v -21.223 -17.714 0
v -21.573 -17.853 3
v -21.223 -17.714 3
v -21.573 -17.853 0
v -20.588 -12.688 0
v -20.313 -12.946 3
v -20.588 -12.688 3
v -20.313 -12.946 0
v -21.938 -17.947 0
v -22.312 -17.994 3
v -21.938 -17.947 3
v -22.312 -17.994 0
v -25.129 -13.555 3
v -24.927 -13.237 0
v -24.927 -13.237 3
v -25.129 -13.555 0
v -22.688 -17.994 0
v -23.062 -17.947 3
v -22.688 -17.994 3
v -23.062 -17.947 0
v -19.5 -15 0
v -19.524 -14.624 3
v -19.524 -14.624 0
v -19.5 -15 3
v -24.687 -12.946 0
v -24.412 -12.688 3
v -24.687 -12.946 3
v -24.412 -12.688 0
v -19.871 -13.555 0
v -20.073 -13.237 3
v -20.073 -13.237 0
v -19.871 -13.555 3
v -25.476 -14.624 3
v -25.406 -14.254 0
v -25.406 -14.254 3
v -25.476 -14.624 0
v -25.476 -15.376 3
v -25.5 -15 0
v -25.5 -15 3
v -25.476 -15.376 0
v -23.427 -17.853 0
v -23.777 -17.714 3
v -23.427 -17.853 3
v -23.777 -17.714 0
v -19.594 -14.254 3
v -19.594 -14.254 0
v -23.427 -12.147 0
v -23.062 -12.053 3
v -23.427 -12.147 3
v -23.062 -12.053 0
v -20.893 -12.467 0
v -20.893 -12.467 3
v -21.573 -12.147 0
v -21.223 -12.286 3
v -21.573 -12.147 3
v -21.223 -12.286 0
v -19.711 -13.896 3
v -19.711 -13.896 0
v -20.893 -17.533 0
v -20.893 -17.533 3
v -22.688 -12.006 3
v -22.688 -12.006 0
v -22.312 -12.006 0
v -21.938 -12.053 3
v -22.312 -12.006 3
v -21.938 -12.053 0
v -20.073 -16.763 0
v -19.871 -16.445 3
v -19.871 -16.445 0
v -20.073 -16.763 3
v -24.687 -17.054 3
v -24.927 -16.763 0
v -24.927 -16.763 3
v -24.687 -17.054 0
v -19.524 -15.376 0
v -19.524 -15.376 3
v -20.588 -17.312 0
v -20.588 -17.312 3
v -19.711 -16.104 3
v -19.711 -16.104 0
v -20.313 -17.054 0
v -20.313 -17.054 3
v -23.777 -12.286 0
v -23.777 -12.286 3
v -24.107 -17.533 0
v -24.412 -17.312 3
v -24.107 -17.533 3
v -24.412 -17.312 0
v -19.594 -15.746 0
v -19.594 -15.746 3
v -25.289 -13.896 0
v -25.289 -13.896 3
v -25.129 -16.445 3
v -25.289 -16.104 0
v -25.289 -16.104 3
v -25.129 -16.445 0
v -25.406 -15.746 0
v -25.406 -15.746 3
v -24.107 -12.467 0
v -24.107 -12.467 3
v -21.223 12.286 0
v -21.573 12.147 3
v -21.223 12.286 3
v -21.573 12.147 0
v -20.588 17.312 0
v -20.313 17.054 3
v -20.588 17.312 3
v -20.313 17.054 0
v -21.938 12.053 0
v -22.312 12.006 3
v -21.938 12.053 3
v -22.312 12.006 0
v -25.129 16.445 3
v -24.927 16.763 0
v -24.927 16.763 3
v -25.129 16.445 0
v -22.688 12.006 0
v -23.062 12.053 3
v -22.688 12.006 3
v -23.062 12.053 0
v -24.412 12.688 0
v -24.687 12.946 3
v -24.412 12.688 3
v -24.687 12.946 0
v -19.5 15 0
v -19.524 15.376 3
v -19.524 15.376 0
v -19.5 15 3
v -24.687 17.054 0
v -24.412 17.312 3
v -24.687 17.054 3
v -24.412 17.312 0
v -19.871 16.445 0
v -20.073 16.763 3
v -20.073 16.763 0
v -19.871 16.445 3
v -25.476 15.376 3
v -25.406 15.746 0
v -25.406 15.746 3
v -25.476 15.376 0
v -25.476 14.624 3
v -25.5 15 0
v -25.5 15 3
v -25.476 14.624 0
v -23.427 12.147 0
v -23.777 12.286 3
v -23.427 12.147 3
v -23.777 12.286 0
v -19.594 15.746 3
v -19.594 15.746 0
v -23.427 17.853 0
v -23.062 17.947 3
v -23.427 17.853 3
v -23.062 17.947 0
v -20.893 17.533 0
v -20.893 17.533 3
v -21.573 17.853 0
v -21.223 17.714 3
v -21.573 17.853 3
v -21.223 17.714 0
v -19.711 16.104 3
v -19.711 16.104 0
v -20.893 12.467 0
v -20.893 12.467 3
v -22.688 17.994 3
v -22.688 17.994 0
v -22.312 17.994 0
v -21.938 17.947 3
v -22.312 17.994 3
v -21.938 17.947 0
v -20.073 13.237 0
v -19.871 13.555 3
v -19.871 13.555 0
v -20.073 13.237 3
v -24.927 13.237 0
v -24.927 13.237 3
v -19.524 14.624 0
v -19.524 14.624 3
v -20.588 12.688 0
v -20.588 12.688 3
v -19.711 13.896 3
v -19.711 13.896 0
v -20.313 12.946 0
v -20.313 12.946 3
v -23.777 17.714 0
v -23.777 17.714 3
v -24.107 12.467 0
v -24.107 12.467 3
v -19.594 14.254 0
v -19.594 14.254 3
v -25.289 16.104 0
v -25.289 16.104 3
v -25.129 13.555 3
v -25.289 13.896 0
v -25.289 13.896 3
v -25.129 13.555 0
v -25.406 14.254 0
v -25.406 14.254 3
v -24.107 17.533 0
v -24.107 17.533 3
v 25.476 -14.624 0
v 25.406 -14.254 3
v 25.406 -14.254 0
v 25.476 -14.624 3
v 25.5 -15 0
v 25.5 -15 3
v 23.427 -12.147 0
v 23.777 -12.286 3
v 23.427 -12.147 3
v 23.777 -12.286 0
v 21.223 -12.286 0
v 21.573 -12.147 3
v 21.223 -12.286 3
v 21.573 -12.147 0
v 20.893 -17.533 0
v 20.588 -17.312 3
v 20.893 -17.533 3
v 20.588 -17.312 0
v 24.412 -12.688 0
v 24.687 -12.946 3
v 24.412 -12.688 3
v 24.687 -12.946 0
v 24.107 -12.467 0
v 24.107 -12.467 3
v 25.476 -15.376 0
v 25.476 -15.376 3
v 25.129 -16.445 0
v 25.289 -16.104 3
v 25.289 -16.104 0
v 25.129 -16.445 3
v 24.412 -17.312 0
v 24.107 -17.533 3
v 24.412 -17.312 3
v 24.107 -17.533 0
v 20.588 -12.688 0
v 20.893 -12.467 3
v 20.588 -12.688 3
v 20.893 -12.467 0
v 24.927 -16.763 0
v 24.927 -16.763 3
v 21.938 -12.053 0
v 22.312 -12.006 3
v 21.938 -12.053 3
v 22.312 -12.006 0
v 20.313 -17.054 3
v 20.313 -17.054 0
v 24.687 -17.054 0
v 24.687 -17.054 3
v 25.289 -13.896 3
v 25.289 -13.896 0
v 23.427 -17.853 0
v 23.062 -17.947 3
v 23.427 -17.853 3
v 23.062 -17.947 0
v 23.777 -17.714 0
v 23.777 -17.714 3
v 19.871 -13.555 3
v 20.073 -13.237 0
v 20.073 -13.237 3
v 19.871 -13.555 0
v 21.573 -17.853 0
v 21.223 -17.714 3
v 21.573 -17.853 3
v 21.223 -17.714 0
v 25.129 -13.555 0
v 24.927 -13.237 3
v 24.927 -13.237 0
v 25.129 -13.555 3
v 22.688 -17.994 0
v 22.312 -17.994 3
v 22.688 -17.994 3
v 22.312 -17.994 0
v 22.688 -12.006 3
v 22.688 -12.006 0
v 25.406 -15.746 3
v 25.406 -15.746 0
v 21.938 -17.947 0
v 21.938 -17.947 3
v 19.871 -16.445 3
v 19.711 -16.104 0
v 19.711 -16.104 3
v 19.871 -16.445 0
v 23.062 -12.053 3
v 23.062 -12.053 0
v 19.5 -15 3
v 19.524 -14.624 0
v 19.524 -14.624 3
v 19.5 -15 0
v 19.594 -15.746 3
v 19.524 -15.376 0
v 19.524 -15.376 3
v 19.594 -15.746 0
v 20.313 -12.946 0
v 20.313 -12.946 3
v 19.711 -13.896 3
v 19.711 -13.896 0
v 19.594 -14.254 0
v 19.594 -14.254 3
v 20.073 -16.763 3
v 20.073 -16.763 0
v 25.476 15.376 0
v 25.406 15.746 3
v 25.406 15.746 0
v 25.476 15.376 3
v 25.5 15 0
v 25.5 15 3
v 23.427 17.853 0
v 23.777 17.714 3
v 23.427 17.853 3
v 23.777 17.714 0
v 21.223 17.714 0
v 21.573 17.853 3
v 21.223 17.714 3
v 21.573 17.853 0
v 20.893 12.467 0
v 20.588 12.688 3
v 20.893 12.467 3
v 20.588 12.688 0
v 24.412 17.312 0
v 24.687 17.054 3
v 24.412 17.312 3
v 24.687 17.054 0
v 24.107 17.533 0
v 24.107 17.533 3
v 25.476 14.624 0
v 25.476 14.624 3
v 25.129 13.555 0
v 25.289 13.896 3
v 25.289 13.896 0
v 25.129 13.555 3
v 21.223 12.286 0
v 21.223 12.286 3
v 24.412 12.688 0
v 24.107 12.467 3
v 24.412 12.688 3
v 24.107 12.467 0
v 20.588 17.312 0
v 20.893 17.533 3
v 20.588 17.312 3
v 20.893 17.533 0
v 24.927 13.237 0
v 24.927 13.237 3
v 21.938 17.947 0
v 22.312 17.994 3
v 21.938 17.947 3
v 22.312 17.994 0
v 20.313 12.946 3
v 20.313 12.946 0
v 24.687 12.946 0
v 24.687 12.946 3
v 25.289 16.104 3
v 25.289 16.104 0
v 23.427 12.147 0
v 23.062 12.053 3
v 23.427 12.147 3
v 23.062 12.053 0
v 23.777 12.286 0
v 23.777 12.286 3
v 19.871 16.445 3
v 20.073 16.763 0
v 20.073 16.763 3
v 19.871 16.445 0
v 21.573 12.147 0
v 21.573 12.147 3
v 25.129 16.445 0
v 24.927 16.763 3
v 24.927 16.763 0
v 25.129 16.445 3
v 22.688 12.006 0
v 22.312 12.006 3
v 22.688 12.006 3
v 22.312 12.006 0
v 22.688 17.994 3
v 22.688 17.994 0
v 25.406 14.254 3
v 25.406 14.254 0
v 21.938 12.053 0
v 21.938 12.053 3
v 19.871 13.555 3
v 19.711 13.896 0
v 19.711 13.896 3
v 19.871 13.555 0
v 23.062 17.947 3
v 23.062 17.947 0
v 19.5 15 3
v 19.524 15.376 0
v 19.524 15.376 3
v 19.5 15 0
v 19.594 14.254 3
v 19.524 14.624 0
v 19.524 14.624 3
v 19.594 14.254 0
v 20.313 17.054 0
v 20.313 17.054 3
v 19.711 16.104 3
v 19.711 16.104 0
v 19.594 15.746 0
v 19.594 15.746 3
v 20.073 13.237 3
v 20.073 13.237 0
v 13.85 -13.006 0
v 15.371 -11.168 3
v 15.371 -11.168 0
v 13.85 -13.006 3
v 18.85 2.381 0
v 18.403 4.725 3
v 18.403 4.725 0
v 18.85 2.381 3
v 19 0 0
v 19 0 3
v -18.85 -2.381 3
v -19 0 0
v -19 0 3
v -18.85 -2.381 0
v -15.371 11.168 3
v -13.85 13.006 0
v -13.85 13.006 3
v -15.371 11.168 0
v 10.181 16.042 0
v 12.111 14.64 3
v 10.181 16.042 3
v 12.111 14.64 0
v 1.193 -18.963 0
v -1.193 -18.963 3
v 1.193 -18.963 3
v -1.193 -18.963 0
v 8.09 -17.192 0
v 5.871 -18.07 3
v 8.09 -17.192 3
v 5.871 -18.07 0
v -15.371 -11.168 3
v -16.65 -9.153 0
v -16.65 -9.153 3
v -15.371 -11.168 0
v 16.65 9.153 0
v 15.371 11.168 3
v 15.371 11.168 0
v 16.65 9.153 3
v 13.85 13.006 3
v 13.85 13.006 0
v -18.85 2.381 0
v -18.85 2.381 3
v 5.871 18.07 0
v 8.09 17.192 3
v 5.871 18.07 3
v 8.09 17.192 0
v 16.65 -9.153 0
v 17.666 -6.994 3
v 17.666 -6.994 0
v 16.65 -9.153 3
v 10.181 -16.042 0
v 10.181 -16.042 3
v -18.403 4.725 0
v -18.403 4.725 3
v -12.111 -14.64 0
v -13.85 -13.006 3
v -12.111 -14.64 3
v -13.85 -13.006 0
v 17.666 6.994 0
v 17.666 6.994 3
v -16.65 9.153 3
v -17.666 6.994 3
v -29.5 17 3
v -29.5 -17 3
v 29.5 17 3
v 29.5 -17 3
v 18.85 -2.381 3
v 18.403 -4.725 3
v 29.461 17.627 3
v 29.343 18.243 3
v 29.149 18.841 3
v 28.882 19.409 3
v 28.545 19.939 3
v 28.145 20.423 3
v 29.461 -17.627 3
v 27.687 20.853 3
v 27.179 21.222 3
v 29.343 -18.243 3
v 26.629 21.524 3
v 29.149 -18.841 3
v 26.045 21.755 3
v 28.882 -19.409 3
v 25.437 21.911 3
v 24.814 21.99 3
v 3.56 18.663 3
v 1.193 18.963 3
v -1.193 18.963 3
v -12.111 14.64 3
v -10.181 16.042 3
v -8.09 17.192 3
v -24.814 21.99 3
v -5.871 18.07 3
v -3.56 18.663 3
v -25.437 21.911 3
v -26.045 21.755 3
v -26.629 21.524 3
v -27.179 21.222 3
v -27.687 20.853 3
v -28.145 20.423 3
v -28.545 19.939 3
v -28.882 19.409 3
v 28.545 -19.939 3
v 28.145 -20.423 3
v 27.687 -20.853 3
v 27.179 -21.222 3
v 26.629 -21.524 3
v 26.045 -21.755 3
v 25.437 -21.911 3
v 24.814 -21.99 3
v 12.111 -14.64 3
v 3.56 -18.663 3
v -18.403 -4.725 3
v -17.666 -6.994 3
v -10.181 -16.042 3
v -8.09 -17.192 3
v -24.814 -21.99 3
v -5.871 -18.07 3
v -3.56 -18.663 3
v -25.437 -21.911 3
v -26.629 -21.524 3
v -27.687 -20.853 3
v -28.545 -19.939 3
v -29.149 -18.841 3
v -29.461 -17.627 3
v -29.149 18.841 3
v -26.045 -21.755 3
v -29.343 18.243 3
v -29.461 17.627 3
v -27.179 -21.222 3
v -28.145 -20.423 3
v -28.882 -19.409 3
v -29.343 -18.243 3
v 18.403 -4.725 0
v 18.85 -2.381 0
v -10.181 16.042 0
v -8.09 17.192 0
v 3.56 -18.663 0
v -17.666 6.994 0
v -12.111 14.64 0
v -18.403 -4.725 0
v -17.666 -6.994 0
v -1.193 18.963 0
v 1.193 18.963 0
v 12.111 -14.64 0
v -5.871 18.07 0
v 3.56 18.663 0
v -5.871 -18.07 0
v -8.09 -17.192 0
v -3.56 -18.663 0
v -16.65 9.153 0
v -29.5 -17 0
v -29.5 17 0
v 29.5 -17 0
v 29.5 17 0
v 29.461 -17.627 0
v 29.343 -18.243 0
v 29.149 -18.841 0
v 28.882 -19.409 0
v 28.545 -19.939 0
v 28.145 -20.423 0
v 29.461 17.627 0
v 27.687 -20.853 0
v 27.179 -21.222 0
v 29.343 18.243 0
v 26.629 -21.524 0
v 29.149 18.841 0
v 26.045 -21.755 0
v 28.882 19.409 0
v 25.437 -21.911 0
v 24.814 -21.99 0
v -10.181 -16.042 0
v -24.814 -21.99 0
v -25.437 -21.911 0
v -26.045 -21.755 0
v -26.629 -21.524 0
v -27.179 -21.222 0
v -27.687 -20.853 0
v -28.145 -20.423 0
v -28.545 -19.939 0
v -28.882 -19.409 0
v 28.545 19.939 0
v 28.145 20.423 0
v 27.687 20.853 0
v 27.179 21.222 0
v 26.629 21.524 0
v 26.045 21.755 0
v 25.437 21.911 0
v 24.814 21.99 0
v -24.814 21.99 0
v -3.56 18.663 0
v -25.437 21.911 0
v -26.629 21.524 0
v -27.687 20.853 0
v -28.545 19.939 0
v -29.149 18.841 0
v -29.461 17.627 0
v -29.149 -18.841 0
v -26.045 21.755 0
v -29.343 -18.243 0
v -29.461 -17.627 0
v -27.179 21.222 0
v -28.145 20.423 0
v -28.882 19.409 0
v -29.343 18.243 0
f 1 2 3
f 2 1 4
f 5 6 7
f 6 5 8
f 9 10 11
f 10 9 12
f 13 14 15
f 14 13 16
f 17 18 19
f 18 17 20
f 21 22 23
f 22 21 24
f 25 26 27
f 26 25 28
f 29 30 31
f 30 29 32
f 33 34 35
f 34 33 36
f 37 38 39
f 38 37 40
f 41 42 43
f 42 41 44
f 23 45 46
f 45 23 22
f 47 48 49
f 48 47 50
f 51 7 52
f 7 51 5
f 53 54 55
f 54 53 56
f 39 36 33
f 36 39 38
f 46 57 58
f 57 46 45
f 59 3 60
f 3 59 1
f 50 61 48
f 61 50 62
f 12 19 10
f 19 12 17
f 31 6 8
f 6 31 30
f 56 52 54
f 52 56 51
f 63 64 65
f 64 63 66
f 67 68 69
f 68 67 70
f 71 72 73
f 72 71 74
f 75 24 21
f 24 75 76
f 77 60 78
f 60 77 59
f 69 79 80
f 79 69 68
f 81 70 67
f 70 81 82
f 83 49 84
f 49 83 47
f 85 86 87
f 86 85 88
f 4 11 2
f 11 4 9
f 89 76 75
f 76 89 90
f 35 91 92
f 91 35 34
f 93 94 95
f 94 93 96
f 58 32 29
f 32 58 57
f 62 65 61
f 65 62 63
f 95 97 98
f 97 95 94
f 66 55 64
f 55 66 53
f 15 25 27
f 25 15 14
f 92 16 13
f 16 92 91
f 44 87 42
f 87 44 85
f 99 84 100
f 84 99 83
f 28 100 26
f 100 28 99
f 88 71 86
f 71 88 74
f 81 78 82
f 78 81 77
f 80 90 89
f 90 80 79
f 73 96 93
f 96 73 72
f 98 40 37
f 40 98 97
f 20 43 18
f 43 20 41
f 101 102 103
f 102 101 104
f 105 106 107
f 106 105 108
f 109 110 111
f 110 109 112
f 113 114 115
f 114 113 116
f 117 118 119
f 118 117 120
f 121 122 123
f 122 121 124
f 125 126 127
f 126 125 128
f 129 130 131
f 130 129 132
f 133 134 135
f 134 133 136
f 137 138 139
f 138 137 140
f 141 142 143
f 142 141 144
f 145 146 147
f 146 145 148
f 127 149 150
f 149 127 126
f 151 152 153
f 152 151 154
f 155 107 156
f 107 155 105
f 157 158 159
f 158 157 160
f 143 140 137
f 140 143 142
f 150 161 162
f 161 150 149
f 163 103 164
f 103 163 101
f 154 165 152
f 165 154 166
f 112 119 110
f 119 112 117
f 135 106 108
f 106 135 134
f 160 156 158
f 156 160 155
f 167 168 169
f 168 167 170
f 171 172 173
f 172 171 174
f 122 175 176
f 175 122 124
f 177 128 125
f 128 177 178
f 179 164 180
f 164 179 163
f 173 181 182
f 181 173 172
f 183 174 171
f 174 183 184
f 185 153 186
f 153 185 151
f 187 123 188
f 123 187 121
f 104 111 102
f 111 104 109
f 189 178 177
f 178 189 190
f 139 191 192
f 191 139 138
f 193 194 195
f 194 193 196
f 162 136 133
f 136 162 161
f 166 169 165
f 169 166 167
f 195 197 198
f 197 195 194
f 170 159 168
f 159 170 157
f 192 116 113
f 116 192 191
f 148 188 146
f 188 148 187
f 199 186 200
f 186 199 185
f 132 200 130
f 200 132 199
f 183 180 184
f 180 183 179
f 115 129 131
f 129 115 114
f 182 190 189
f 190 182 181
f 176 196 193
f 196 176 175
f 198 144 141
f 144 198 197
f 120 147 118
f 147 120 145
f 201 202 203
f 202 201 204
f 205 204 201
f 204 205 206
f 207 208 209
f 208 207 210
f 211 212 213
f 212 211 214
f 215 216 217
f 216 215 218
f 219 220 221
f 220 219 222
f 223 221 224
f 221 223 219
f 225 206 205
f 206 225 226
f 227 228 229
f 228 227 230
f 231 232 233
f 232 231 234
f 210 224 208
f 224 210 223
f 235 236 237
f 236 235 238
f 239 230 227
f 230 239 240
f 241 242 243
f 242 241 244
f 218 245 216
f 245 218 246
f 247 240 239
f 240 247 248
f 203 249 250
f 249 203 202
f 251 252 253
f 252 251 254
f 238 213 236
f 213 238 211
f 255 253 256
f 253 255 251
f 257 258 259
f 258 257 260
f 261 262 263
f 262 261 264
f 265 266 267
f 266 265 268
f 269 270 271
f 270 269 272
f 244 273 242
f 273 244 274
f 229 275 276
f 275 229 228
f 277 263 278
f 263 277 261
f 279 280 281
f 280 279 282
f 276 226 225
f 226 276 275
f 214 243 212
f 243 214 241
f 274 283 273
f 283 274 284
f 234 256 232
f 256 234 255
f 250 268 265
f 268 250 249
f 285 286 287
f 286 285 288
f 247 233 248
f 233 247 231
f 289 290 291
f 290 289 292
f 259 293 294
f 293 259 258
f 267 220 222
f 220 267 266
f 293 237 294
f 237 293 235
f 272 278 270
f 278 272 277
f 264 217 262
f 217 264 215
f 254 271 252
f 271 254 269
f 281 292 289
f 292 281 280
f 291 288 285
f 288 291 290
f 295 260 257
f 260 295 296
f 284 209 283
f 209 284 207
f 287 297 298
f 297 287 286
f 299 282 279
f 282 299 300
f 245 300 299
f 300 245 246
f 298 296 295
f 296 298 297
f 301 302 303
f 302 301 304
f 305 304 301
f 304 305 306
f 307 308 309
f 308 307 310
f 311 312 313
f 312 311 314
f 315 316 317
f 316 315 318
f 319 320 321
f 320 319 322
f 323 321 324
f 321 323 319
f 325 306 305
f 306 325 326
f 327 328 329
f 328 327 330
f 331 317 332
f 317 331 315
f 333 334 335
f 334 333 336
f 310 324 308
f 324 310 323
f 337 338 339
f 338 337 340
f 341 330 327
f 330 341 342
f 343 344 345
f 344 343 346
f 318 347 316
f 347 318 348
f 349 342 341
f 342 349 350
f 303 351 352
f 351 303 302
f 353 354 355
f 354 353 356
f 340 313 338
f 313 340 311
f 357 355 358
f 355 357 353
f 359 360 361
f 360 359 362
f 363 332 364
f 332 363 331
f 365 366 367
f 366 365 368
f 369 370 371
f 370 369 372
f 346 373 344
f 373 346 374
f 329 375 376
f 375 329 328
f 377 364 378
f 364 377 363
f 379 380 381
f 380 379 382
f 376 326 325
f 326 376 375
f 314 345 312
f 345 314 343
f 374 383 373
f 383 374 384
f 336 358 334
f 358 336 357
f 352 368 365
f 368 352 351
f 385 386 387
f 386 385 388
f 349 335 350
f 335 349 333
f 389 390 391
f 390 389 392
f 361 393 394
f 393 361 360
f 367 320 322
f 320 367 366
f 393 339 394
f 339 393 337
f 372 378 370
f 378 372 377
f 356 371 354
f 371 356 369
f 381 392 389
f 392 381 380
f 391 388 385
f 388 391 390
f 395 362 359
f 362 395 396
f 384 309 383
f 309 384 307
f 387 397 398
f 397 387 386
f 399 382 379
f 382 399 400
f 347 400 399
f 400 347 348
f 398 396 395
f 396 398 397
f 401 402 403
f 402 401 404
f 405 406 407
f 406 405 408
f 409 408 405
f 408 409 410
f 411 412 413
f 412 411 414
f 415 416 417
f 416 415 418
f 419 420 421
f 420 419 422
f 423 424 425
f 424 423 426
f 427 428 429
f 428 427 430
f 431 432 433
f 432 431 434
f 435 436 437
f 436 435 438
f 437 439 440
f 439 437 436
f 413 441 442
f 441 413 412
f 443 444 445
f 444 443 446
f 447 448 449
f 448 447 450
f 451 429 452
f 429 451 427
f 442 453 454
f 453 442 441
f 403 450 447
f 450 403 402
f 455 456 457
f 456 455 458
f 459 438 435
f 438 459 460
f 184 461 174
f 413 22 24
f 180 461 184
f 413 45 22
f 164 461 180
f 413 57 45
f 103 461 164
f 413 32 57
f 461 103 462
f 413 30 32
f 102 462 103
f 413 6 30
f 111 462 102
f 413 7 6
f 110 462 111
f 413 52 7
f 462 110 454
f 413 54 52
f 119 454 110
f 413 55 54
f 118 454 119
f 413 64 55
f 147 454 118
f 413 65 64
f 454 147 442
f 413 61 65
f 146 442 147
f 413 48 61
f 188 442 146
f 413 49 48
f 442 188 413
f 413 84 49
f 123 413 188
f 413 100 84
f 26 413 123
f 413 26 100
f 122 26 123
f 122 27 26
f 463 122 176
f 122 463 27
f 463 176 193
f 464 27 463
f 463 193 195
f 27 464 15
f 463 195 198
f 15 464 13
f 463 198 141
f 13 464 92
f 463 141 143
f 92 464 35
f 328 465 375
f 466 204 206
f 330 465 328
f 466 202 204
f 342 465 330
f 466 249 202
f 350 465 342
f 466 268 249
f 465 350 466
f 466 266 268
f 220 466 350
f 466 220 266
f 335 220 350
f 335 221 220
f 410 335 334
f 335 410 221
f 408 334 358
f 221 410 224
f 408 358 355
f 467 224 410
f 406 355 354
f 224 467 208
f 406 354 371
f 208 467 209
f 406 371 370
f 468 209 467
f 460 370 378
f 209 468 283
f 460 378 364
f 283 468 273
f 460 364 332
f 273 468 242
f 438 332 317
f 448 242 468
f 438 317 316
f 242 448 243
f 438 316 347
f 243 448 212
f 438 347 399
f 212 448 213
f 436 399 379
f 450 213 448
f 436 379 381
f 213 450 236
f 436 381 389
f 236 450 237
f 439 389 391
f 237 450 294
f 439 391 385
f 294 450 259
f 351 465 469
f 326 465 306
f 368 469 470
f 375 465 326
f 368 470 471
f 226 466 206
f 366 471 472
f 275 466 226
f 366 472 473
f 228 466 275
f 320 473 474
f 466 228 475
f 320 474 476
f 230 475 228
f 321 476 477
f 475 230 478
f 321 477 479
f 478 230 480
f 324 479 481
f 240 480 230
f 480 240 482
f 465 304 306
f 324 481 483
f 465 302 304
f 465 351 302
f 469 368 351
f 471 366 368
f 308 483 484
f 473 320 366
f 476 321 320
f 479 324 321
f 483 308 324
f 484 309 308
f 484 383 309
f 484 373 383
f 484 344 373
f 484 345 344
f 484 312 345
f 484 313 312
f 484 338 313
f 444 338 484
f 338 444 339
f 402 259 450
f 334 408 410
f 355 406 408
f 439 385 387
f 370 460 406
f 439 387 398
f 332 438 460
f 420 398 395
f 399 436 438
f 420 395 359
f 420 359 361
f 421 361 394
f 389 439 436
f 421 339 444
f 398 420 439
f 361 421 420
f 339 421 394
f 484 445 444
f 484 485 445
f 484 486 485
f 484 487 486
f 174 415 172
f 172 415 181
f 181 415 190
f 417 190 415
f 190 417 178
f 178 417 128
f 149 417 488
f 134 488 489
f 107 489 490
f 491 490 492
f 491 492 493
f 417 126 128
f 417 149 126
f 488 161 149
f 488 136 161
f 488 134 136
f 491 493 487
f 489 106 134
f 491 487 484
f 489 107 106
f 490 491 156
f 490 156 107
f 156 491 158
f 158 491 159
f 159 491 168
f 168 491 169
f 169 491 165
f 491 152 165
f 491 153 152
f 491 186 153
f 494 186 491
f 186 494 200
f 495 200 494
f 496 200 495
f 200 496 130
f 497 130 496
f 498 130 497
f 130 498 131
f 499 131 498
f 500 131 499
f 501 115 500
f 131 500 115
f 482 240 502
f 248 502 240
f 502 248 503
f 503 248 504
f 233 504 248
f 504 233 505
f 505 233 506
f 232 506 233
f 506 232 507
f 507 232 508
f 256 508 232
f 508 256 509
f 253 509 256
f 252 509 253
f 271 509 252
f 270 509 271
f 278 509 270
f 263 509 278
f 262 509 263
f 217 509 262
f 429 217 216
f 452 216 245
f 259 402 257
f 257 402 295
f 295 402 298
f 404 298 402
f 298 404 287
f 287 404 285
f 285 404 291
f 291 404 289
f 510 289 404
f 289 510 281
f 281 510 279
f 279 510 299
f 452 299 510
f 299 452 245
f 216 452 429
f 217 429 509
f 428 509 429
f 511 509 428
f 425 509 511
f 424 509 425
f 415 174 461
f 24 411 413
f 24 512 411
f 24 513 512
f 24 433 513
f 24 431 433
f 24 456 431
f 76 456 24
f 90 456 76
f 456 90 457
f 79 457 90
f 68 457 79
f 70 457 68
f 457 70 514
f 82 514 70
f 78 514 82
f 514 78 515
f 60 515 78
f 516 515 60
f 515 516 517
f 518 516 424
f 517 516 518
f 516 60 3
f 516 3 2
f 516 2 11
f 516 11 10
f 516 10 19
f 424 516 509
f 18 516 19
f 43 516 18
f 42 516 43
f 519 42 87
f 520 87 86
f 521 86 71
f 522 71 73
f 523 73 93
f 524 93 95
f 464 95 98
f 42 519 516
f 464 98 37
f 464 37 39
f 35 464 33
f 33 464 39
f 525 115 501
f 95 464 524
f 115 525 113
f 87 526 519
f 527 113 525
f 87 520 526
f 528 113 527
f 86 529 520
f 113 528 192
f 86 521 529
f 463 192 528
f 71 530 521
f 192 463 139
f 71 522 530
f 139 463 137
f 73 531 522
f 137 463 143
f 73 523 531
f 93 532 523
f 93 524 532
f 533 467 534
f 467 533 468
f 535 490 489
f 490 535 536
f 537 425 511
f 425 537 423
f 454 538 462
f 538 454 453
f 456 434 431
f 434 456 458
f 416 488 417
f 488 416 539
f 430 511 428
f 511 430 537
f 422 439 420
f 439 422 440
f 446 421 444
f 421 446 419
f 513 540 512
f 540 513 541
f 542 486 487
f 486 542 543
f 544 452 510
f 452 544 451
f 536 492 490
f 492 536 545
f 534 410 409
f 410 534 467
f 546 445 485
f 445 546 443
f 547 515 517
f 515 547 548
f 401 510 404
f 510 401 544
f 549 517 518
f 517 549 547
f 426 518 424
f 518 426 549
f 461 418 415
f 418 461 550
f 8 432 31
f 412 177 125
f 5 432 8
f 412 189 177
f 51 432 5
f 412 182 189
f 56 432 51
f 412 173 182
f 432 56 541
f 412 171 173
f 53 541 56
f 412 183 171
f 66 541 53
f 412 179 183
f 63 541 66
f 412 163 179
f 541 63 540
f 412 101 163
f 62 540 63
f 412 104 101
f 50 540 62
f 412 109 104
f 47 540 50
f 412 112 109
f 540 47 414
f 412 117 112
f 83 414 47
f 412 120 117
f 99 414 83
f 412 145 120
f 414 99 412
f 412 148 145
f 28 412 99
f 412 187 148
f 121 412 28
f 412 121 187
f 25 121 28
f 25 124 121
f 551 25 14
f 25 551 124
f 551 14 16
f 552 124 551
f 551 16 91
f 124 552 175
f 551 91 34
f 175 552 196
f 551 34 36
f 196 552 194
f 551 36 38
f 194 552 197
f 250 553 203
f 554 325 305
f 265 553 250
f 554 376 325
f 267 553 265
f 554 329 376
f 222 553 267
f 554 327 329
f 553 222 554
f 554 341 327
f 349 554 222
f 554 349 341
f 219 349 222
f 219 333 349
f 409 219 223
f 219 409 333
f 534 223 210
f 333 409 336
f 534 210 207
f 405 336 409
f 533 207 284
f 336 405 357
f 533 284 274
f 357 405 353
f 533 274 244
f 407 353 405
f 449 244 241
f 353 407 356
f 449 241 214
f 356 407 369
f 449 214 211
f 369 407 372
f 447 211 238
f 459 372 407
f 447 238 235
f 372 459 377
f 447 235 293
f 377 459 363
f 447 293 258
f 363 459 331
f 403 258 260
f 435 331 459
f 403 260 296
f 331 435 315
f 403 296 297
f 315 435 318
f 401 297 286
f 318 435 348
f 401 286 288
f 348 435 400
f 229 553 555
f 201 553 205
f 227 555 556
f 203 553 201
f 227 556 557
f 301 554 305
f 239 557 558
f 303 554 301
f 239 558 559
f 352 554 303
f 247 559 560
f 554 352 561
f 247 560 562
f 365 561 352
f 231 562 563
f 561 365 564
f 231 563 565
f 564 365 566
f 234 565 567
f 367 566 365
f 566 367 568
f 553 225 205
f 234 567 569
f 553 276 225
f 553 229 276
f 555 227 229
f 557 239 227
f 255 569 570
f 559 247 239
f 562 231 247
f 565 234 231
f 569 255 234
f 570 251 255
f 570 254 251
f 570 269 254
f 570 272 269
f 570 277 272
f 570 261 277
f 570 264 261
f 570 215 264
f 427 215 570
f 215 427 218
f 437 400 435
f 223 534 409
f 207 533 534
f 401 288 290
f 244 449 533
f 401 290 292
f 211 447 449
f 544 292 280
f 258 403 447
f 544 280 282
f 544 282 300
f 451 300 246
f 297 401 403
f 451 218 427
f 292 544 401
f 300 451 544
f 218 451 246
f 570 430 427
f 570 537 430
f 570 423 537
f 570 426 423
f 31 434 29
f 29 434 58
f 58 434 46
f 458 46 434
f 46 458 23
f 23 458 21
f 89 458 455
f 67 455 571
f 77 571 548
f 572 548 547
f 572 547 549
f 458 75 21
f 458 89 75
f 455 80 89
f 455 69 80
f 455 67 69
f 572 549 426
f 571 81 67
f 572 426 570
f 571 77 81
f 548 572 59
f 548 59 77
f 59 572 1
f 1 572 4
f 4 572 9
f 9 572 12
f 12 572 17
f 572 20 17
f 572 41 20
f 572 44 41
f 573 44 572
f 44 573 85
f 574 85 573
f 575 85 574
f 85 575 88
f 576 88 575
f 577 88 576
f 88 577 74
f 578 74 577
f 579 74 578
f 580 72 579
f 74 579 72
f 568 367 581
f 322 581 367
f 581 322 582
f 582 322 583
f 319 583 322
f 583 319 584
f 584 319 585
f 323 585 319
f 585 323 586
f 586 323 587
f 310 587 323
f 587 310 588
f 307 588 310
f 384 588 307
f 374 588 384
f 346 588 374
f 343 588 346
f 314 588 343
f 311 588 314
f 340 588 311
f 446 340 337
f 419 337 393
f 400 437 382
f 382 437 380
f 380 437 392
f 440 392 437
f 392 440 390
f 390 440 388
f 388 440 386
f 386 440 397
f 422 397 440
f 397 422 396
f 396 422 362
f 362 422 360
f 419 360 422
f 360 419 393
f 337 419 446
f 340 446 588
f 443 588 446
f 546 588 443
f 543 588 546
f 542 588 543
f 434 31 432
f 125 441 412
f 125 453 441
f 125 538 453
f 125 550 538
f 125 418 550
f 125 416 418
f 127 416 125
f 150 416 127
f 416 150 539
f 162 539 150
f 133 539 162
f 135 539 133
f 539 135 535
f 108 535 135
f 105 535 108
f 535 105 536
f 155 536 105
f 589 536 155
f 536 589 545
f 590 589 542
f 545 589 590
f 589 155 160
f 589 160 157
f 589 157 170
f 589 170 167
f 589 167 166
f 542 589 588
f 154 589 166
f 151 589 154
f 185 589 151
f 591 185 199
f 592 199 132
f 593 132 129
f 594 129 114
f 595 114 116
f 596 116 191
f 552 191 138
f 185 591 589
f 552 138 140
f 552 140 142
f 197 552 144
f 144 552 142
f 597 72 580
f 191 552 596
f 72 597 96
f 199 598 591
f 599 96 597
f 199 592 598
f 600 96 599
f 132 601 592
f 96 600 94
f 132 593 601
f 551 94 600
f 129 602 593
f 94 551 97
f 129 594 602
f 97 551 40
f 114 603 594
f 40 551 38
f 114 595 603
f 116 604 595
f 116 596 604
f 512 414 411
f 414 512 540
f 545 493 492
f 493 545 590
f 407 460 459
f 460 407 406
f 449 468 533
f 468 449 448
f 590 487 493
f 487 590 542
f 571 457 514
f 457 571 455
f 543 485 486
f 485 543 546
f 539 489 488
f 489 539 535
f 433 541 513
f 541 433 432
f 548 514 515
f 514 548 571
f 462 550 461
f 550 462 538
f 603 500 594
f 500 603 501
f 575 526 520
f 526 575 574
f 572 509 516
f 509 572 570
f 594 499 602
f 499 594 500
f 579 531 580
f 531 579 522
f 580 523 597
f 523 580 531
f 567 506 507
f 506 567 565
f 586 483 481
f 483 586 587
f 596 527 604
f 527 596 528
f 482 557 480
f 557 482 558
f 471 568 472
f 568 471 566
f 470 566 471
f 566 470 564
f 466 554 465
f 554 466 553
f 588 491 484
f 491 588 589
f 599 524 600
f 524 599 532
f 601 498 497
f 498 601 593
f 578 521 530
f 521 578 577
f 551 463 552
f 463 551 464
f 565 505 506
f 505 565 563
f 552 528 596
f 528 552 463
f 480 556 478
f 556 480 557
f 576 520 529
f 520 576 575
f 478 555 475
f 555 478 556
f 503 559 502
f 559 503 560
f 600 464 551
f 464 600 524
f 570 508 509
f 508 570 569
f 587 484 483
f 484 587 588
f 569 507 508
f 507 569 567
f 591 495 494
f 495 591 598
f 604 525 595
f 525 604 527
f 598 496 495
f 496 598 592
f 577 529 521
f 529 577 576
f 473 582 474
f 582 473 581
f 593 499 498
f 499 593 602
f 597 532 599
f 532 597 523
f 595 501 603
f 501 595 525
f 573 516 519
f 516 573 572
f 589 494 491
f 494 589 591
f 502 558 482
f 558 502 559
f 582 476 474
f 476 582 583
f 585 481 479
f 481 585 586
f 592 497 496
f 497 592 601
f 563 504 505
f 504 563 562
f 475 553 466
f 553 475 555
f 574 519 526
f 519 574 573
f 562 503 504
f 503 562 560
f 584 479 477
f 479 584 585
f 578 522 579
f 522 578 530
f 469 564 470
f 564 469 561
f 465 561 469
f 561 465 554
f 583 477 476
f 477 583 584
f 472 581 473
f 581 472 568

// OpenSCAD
$fn = 50;


difference() {
	union() {
		hull() {
			translate(v = [-24.5000000000, 17.0000000000, 0]) {
				cylinder(h = 3, r = 5);
			}
			translate(v = [24.5000000000, 17.0000000000, 0]) {
				cylinder(h = 3, r = 5);
			}
			translate(v = [-24.5000000000, -17.0000000000, 0]) {
				cylinder(h = 3, r = 5);
			}
			translate(v = [24.5000000000, -17.0000000000, 0]) {
				cylinder(h = 3, r = 5);
			}
		}
	}
	union() {
		#translate(v = [-22.5000000000, -15.0000000000, -100.0000000000]) {
			cylinder(h = 200, r = 3.0000000000);
		}
		#translate(v = [-22.5000000000, 15.0000000000, -100.0000000000]) {
			cylinder(h = 200, r = 3.0000000000);
		}
		#translate(v = [22.5000000000, -15.0000000000, -100.0000000000]) {
			cylinder(h = 200, r = 3.0000000000);
		}
		#translate(v = [22.5000000000, 15.0000000000, -100.0000000000]) {
			cylinder(h = 200, r = 3.0000000000);
		}
		#cylinder(h = 3, r = 19.0000000000);
	}
}
